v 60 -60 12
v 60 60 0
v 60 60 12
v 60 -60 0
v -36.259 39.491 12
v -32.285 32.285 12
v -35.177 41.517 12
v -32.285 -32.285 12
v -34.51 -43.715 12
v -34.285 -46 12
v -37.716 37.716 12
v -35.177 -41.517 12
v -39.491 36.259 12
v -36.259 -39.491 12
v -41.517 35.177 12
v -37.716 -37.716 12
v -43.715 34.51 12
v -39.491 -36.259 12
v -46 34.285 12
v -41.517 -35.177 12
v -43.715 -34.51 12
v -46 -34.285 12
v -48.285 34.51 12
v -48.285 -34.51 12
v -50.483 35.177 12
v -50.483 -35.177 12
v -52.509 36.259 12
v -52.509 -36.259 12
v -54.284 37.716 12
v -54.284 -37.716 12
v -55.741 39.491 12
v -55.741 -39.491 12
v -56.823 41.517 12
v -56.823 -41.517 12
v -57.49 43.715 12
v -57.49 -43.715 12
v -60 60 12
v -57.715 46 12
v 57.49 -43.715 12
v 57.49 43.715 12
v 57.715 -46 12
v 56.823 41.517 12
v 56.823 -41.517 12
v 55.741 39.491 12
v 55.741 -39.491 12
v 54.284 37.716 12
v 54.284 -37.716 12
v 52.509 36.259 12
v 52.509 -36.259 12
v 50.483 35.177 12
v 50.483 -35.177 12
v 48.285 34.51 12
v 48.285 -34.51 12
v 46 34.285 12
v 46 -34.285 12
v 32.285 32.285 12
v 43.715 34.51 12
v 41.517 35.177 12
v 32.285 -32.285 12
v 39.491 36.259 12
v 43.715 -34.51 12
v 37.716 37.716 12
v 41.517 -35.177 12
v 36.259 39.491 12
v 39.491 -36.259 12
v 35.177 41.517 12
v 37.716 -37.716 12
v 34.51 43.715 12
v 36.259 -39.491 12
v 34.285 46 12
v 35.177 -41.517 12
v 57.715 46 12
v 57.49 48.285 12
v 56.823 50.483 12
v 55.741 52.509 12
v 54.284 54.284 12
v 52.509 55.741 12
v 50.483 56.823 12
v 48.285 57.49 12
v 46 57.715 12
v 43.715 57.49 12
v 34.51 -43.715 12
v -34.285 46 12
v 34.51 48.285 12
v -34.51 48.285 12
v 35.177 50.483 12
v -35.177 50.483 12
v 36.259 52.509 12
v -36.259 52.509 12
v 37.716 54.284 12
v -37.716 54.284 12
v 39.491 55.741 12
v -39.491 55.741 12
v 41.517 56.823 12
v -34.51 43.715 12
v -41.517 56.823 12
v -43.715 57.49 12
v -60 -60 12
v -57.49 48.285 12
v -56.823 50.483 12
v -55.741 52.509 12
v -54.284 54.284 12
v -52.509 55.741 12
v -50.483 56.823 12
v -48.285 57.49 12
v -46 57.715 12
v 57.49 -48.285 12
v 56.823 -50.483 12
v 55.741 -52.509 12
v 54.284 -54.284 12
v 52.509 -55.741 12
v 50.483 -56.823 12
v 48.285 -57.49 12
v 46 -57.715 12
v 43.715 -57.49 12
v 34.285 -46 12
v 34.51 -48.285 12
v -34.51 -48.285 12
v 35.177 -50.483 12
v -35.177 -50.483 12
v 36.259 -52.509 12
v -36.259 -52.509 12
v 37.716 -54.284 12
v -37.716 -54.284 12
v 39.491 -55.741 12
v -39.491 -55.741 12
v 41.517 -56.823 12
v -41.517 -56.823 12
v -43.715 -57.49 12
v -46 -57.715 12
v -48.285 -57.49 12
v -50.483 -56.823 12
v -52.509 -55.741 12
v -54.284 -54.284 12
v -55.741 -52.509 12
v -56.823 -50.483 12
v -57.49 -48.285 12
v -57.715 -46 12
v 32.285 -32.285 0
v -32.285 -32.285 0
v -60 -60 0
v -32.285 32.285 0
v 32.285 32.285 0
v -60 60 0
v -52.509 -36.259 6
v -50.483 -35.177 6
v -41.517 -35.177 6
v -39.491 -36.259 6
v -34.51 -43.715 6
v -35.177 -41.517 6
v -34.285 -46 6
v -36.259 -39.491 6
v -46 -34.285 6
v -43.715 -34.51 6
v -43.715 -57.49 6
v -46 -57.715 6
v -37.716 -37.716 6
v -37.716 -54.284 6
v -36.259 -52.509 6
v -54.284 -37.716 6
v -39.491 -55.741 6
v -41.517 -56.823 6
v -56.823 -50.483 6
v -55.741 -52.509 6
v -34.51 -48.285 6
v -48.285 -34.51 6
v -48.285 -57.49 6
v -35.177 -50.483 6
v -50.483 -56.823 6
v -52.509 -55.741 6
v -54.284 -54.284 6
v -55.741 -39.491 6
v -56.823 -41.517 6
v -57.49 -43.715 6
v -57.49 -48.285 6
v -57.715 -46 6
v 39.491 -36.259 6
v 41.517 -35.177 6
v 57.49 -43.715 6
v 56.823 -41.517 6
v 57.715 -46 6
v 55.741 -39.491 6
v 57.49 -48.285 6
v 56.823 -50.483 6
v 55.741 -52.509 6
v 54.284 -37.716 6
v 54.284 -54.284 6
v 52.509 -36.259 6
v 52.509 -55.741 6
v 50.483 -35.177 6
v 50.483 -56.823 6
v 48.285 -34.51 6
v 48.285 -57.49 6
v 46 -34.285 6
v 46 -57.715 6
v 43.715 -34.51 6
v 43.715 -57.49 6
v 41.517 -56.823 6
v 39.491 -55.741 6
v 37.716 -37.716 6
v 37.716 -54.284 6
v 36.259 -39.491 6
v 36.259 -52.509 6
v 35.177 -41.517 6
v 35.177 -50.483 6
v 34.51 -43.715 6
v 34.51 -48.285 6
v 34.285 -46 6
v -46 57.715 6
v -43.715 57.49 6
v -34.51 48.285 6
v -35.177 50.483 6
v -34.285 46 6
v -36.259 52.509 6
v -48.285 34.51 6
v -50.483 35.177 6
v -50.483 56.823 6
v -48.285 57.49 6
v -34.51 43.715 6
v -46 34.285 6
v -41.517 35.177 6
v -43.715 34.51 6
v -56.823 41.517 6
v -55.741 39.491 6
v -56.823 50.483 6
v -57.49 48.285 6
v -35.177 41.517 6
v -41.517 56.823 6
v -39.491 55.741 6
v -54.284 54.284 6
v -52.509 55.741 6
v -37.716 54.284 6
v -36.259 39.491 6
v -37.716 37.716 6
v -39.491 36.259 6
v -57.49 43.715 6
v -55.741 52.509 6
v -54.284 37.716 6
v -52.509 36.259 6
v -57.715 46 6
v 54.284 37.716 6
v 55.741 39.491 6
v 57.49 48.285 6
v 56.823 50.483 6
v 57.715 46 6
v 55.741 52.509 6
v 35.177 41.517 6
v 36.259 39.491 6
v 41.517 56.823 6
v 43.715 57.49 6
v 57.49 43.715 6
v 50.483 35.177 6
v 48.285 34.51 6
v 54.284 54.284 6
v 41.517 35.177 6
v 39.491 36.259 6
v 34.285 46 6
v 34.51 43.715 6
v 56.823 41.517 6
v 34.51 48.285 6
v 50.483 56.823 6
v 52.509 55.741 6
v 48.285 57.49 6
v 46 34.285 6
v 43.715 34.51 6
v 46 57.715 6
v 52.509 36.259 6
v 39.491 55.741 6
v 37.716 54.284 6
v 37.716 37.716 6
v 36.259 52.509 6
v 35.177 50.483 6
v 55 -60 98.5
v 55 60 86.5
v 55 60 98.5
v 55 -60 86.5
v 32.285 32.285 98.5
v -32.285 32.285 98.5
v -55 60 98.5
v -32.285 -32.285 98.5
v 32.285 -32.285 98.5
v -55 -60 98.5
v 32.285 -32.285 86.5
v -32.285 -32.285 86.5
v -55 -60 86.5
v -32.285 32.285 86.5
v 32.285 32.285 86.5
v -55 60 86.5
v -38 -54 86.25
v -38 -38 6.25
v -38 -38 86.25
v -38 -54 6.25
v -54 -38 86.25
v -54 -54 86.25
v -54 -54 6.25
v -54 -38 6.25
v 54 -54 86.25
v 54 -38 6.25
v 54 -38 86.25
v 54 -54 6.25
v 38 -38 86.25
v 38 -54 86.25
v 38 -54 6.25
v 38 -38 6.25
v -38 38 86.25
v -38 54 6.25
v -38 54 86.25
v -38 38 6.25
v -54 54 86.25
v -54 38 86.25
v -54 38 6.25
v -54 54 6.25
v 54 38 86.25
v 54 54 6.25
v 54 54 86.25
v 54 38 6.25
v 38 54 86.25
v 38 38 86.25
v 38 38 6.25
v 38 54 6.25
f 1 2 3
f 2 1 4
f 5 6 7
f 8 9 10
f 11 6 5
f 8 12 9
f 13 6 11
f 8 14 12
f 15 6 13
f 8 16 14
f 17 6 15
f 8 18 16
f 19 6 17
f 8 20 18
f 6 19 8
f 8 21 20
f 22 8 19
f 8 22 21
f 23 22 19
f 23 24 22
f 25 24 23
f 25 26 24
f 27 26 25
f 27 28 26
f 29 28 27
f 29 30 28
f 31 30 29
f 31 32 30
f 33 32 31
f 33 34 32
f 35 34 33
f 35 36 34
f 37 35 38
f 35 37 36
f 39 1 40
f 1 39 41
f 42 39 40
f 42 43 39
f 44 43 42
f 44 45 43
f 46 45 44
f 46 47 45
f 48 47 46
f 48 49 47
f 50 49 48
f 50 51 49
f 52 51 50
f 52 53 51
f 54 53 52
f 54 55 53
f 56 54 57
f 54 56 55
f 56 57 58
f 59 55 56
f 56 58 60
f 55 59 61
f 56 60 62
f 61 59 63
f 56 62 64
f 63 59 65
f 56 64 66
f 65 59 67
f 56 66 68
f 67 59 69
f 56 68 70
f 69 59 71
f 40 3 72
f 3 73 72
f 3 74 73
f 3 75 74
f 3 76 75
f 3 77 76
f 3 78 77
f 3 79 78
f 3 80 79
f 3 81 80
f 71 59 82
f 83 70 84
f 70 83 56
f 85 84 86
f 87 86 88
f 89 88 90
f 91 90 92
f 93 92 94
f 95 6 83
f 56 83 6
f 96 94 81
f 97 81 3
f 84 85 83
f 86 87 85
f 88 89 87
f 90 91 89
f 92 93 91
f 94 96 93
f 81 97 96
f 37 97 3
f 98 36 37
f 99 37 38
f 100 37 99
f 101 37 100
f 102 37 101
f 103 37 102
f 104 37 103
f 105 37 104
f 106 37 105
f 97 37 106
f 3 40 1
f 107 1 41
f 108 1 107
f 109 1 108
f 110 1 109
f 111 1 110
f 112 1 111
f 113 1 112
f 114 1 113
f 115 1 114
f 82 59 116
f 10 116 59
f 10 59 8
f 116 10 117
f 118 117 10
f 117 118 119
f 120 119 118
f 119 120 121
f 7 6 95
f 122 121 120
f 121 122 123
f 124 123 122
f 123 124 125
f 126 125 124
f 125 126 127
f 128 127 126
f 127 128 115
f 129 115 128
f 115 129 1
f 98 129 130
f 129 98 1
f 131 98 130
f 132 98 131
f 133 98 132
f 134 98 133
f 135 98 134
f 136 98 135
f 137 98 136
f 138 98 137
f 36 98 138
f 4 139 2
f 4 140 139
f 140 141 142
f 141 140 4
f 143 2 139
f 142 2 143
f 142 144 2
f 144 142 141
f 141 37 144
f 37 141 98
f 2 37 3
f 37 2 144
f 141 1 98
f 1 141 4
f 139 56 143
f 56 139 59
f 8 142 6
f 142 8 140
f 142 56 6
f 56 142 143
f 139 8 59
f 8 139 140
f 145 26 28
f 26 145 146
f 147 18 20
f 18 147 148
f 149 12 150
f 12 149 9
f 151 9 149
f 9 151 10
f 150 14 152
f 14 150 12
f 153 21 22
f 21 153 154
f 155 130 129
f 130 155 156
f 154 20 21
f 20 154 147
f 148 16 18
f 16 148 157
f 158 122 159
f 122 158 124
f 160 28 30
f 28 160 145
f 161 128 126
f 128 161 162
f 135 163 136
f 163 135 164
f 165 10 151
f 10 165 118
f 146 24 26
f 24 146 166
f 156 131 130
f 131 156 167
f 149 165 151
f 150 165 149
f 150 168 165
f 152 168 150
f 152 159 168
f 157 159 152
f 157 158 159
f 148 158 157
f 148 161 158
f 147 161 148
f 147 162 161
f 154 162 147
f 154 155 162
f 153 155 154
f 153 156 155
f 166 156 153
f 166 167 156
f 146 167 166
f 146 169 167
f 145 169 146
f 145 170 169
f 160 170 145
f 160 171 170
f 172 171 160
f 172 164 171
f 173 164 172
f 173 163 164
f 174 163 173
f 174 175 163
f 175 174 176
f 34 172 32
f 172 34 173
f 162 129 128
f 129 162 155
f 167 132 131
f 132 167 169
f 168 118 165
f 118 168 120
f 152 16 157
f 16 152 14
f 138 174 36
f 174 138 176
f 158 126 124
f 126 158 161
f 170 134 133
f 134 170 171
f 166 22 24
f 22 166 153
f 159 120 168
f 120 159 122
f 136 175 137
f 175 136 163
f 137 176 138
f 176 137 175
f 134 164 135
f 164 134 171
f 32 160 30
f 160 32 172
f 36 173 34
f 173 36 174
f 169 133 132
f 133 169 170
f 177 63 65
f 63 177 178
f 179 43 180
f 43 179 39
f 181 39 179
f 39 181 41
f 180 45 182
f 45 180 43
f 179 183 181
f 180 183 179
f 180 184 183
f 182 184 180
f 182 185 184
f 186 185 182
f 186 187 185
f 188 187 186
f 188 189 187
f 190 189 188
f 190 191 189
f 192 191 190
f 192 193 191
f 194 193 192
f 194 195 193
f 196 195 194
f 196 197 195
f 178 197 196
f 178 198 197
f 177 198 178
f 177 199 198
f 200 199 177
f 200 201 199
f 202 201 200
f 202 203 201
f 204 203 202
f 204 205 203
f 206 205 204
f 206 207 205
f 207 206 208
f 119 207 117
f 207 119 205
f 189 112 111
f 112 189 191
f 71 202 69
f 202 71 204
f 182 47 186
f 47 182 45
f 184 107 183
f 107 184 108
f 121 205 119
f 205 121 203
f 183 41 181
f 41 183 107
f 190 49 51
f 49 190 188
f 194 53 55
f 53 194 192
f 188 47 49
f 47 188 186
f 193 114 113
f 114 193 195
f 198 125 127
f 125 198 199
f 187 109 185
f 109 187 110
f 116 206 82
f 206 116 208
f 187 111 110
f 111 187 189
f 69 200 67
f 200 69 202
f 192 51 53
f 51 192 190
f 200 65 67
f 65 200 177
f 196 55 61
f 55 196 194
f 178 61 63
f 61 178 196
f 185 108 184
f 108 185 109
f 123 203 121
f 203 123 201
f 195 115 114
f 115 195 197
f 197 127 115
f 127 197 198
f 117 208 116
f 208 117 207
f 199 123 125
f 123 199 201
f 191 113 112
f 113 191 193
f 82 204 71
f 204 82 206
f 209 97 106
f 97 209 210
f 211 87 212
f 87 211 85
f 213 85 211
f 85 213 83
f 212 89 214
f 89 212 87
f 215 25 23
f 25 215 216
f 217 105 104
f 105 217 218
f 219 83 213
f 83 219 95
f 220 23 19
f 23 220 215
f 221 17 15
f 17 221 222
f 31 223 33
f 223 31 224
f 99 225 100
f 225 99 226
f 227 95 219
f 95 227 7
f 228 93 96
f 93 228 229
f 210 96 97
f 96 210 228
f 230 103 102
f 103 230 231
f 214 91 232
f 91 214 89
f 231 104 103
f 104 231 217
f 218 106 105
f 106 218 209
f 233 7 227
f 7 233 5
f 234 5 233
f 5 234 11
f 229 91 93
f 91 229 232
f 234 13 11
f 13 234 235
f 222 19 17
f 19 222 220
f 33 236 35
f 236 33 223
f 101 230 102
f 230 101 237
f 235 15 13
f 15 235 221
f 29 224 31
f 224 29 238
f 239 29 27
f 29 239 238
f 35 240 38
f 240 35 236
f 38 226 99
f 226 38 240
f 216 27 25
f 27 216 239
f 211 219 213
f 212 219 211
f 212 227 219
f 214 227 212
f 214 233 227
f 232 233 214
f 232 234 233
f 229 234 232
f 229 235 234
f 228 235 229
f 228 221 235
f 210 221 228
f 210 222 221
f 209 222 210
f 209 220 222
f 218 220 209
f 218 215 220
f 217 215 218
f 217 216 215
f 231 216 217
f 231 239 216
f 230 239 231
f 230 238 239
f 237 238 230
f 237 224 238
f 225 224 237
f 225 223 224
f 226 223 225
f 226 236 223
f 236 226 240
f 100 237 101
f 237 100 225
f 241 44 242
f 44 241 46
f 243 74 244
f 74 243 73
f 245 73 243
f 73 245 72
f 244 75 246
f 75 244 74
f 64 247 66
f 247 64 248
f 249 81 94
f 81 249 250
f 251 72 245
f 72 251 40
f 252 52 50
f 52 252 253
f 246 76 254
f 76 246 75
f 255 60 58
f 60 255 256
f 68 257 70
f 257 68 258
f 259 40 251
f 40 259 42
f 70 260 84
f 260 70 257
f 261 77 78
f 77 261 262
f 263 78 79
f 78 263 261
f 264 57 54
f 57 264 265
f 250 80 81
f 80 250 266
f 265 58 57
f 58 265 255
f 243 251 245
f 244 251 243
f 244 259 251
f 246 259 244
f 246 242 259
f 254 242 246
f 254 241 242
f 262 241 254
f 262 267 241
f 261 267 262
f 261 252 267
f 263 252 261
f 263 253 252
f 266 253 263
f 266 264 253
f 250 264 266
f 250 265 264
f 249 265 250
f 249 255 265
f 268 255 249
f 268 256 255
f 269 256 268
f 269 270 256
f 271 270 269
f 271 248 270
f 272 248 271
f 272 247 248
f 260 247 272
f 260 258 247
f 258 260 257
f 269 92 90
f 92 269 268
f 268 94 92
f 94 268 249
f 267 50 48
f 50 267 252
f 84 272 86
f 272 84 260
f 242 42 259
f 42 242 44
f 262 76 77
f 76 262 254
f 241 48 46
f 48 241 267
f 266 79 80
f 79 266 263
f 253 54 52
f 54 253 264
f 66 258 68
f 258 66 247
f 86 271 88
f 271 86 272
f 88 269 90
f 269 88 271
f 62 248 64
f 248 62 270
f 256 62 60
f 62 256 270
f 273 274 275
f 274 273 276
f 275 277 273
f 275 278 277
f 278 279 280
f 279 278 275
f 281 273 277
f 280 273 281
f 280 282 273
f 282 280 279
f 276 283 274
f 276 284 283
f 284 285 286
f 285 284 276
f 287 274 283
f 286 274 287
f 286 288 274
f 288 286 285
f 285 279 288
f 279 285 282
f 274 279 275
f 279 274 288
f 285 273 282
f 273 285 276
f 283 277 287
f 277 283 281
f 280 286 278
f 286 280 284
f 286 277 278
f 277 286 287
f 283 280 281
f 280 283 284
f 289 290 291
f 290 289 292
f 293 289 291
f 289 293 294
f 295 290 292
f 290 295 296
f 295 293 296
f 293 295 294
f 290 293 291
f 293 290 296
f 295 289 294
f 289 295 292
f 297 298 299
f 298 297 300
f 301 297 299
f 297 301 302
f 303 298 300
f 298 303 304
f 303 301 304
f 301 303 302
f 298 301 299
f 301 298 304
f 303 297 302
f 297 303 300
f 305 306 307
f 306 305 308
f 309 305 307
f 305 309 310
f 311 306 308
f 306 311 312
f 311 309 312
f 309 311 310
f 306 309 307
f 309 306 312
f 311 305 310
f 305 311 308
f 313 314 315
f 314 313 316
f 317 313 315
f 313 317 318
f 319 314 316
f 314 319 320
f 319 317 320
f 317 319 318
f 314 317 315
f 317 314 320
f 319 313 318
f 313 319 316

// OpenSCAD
$fn = 32;

// ------------------------------------------------------------------------
// Frame cube: base 120 x 120 mm, posts 80 mm tall
// Every part is its own module, assembly() places every instance.
// ------------------------------------------------------------------------

// --- part 1 ---
module base_frame() {
  difference() {
    translate([-60, -60, 0]) cube([120, 120, 12]);
    translate([-32.285, -32.285, -1]) cube([64.57, 64.57, 14]);
    translate([-46, -46, 6]) cylinder(h = 7, d = 23.43);
    translate([46, -46, 6]) cylinder(h = 7, d = 23.43);
    translate([-46, 46, 6]) cylinder(h = 7, d = 23.43);
    translate([46, 46, 6]) cylinder(h = 7, d = 23.43);
  }
}

// --- part 2 ---
module corner_post() {
  translate([-8, -8, 0]) cube([16, 16, 80]);
}

// --- part 3 ---
module top_frame() {
  difference() {
    translate([-55, -60, 0]) cube([110, 120, 12]);
    translate([-32.285, -32.285, -1]) cube([64.57, 64.57, 14]);
  }
}

// --- assembly ---
module assembly() {
  color([0.80, 0.24, 0.20]) translate([0, 0, 0]) rotate([0, 0, 0]) base_frame();
  color([0.20, 0.45, 0.75]) translate([-46, -46, 6.25]) rotate([0, 0, 0]) corner_post();
  color([0.25, 0.62, 0.32]) translate([46, -46, 6.25]) rotate([0, 0, 0]) corner_post();
  color([0.92, 0.70, 0.18]) translate([-46, 46, 6.25]) rotate([0, 0, 0]) corner_post();
  color([0.58, 0.35, 0.70]) translate([46, 46, 6.25]) rotate([0, 0, 0]) corner_post();
  color([0.16, 0.66, 0.66]) translate([0, 0, 86.5]) rotate([0, 0, 0]) top_frame();
}

assembly();
